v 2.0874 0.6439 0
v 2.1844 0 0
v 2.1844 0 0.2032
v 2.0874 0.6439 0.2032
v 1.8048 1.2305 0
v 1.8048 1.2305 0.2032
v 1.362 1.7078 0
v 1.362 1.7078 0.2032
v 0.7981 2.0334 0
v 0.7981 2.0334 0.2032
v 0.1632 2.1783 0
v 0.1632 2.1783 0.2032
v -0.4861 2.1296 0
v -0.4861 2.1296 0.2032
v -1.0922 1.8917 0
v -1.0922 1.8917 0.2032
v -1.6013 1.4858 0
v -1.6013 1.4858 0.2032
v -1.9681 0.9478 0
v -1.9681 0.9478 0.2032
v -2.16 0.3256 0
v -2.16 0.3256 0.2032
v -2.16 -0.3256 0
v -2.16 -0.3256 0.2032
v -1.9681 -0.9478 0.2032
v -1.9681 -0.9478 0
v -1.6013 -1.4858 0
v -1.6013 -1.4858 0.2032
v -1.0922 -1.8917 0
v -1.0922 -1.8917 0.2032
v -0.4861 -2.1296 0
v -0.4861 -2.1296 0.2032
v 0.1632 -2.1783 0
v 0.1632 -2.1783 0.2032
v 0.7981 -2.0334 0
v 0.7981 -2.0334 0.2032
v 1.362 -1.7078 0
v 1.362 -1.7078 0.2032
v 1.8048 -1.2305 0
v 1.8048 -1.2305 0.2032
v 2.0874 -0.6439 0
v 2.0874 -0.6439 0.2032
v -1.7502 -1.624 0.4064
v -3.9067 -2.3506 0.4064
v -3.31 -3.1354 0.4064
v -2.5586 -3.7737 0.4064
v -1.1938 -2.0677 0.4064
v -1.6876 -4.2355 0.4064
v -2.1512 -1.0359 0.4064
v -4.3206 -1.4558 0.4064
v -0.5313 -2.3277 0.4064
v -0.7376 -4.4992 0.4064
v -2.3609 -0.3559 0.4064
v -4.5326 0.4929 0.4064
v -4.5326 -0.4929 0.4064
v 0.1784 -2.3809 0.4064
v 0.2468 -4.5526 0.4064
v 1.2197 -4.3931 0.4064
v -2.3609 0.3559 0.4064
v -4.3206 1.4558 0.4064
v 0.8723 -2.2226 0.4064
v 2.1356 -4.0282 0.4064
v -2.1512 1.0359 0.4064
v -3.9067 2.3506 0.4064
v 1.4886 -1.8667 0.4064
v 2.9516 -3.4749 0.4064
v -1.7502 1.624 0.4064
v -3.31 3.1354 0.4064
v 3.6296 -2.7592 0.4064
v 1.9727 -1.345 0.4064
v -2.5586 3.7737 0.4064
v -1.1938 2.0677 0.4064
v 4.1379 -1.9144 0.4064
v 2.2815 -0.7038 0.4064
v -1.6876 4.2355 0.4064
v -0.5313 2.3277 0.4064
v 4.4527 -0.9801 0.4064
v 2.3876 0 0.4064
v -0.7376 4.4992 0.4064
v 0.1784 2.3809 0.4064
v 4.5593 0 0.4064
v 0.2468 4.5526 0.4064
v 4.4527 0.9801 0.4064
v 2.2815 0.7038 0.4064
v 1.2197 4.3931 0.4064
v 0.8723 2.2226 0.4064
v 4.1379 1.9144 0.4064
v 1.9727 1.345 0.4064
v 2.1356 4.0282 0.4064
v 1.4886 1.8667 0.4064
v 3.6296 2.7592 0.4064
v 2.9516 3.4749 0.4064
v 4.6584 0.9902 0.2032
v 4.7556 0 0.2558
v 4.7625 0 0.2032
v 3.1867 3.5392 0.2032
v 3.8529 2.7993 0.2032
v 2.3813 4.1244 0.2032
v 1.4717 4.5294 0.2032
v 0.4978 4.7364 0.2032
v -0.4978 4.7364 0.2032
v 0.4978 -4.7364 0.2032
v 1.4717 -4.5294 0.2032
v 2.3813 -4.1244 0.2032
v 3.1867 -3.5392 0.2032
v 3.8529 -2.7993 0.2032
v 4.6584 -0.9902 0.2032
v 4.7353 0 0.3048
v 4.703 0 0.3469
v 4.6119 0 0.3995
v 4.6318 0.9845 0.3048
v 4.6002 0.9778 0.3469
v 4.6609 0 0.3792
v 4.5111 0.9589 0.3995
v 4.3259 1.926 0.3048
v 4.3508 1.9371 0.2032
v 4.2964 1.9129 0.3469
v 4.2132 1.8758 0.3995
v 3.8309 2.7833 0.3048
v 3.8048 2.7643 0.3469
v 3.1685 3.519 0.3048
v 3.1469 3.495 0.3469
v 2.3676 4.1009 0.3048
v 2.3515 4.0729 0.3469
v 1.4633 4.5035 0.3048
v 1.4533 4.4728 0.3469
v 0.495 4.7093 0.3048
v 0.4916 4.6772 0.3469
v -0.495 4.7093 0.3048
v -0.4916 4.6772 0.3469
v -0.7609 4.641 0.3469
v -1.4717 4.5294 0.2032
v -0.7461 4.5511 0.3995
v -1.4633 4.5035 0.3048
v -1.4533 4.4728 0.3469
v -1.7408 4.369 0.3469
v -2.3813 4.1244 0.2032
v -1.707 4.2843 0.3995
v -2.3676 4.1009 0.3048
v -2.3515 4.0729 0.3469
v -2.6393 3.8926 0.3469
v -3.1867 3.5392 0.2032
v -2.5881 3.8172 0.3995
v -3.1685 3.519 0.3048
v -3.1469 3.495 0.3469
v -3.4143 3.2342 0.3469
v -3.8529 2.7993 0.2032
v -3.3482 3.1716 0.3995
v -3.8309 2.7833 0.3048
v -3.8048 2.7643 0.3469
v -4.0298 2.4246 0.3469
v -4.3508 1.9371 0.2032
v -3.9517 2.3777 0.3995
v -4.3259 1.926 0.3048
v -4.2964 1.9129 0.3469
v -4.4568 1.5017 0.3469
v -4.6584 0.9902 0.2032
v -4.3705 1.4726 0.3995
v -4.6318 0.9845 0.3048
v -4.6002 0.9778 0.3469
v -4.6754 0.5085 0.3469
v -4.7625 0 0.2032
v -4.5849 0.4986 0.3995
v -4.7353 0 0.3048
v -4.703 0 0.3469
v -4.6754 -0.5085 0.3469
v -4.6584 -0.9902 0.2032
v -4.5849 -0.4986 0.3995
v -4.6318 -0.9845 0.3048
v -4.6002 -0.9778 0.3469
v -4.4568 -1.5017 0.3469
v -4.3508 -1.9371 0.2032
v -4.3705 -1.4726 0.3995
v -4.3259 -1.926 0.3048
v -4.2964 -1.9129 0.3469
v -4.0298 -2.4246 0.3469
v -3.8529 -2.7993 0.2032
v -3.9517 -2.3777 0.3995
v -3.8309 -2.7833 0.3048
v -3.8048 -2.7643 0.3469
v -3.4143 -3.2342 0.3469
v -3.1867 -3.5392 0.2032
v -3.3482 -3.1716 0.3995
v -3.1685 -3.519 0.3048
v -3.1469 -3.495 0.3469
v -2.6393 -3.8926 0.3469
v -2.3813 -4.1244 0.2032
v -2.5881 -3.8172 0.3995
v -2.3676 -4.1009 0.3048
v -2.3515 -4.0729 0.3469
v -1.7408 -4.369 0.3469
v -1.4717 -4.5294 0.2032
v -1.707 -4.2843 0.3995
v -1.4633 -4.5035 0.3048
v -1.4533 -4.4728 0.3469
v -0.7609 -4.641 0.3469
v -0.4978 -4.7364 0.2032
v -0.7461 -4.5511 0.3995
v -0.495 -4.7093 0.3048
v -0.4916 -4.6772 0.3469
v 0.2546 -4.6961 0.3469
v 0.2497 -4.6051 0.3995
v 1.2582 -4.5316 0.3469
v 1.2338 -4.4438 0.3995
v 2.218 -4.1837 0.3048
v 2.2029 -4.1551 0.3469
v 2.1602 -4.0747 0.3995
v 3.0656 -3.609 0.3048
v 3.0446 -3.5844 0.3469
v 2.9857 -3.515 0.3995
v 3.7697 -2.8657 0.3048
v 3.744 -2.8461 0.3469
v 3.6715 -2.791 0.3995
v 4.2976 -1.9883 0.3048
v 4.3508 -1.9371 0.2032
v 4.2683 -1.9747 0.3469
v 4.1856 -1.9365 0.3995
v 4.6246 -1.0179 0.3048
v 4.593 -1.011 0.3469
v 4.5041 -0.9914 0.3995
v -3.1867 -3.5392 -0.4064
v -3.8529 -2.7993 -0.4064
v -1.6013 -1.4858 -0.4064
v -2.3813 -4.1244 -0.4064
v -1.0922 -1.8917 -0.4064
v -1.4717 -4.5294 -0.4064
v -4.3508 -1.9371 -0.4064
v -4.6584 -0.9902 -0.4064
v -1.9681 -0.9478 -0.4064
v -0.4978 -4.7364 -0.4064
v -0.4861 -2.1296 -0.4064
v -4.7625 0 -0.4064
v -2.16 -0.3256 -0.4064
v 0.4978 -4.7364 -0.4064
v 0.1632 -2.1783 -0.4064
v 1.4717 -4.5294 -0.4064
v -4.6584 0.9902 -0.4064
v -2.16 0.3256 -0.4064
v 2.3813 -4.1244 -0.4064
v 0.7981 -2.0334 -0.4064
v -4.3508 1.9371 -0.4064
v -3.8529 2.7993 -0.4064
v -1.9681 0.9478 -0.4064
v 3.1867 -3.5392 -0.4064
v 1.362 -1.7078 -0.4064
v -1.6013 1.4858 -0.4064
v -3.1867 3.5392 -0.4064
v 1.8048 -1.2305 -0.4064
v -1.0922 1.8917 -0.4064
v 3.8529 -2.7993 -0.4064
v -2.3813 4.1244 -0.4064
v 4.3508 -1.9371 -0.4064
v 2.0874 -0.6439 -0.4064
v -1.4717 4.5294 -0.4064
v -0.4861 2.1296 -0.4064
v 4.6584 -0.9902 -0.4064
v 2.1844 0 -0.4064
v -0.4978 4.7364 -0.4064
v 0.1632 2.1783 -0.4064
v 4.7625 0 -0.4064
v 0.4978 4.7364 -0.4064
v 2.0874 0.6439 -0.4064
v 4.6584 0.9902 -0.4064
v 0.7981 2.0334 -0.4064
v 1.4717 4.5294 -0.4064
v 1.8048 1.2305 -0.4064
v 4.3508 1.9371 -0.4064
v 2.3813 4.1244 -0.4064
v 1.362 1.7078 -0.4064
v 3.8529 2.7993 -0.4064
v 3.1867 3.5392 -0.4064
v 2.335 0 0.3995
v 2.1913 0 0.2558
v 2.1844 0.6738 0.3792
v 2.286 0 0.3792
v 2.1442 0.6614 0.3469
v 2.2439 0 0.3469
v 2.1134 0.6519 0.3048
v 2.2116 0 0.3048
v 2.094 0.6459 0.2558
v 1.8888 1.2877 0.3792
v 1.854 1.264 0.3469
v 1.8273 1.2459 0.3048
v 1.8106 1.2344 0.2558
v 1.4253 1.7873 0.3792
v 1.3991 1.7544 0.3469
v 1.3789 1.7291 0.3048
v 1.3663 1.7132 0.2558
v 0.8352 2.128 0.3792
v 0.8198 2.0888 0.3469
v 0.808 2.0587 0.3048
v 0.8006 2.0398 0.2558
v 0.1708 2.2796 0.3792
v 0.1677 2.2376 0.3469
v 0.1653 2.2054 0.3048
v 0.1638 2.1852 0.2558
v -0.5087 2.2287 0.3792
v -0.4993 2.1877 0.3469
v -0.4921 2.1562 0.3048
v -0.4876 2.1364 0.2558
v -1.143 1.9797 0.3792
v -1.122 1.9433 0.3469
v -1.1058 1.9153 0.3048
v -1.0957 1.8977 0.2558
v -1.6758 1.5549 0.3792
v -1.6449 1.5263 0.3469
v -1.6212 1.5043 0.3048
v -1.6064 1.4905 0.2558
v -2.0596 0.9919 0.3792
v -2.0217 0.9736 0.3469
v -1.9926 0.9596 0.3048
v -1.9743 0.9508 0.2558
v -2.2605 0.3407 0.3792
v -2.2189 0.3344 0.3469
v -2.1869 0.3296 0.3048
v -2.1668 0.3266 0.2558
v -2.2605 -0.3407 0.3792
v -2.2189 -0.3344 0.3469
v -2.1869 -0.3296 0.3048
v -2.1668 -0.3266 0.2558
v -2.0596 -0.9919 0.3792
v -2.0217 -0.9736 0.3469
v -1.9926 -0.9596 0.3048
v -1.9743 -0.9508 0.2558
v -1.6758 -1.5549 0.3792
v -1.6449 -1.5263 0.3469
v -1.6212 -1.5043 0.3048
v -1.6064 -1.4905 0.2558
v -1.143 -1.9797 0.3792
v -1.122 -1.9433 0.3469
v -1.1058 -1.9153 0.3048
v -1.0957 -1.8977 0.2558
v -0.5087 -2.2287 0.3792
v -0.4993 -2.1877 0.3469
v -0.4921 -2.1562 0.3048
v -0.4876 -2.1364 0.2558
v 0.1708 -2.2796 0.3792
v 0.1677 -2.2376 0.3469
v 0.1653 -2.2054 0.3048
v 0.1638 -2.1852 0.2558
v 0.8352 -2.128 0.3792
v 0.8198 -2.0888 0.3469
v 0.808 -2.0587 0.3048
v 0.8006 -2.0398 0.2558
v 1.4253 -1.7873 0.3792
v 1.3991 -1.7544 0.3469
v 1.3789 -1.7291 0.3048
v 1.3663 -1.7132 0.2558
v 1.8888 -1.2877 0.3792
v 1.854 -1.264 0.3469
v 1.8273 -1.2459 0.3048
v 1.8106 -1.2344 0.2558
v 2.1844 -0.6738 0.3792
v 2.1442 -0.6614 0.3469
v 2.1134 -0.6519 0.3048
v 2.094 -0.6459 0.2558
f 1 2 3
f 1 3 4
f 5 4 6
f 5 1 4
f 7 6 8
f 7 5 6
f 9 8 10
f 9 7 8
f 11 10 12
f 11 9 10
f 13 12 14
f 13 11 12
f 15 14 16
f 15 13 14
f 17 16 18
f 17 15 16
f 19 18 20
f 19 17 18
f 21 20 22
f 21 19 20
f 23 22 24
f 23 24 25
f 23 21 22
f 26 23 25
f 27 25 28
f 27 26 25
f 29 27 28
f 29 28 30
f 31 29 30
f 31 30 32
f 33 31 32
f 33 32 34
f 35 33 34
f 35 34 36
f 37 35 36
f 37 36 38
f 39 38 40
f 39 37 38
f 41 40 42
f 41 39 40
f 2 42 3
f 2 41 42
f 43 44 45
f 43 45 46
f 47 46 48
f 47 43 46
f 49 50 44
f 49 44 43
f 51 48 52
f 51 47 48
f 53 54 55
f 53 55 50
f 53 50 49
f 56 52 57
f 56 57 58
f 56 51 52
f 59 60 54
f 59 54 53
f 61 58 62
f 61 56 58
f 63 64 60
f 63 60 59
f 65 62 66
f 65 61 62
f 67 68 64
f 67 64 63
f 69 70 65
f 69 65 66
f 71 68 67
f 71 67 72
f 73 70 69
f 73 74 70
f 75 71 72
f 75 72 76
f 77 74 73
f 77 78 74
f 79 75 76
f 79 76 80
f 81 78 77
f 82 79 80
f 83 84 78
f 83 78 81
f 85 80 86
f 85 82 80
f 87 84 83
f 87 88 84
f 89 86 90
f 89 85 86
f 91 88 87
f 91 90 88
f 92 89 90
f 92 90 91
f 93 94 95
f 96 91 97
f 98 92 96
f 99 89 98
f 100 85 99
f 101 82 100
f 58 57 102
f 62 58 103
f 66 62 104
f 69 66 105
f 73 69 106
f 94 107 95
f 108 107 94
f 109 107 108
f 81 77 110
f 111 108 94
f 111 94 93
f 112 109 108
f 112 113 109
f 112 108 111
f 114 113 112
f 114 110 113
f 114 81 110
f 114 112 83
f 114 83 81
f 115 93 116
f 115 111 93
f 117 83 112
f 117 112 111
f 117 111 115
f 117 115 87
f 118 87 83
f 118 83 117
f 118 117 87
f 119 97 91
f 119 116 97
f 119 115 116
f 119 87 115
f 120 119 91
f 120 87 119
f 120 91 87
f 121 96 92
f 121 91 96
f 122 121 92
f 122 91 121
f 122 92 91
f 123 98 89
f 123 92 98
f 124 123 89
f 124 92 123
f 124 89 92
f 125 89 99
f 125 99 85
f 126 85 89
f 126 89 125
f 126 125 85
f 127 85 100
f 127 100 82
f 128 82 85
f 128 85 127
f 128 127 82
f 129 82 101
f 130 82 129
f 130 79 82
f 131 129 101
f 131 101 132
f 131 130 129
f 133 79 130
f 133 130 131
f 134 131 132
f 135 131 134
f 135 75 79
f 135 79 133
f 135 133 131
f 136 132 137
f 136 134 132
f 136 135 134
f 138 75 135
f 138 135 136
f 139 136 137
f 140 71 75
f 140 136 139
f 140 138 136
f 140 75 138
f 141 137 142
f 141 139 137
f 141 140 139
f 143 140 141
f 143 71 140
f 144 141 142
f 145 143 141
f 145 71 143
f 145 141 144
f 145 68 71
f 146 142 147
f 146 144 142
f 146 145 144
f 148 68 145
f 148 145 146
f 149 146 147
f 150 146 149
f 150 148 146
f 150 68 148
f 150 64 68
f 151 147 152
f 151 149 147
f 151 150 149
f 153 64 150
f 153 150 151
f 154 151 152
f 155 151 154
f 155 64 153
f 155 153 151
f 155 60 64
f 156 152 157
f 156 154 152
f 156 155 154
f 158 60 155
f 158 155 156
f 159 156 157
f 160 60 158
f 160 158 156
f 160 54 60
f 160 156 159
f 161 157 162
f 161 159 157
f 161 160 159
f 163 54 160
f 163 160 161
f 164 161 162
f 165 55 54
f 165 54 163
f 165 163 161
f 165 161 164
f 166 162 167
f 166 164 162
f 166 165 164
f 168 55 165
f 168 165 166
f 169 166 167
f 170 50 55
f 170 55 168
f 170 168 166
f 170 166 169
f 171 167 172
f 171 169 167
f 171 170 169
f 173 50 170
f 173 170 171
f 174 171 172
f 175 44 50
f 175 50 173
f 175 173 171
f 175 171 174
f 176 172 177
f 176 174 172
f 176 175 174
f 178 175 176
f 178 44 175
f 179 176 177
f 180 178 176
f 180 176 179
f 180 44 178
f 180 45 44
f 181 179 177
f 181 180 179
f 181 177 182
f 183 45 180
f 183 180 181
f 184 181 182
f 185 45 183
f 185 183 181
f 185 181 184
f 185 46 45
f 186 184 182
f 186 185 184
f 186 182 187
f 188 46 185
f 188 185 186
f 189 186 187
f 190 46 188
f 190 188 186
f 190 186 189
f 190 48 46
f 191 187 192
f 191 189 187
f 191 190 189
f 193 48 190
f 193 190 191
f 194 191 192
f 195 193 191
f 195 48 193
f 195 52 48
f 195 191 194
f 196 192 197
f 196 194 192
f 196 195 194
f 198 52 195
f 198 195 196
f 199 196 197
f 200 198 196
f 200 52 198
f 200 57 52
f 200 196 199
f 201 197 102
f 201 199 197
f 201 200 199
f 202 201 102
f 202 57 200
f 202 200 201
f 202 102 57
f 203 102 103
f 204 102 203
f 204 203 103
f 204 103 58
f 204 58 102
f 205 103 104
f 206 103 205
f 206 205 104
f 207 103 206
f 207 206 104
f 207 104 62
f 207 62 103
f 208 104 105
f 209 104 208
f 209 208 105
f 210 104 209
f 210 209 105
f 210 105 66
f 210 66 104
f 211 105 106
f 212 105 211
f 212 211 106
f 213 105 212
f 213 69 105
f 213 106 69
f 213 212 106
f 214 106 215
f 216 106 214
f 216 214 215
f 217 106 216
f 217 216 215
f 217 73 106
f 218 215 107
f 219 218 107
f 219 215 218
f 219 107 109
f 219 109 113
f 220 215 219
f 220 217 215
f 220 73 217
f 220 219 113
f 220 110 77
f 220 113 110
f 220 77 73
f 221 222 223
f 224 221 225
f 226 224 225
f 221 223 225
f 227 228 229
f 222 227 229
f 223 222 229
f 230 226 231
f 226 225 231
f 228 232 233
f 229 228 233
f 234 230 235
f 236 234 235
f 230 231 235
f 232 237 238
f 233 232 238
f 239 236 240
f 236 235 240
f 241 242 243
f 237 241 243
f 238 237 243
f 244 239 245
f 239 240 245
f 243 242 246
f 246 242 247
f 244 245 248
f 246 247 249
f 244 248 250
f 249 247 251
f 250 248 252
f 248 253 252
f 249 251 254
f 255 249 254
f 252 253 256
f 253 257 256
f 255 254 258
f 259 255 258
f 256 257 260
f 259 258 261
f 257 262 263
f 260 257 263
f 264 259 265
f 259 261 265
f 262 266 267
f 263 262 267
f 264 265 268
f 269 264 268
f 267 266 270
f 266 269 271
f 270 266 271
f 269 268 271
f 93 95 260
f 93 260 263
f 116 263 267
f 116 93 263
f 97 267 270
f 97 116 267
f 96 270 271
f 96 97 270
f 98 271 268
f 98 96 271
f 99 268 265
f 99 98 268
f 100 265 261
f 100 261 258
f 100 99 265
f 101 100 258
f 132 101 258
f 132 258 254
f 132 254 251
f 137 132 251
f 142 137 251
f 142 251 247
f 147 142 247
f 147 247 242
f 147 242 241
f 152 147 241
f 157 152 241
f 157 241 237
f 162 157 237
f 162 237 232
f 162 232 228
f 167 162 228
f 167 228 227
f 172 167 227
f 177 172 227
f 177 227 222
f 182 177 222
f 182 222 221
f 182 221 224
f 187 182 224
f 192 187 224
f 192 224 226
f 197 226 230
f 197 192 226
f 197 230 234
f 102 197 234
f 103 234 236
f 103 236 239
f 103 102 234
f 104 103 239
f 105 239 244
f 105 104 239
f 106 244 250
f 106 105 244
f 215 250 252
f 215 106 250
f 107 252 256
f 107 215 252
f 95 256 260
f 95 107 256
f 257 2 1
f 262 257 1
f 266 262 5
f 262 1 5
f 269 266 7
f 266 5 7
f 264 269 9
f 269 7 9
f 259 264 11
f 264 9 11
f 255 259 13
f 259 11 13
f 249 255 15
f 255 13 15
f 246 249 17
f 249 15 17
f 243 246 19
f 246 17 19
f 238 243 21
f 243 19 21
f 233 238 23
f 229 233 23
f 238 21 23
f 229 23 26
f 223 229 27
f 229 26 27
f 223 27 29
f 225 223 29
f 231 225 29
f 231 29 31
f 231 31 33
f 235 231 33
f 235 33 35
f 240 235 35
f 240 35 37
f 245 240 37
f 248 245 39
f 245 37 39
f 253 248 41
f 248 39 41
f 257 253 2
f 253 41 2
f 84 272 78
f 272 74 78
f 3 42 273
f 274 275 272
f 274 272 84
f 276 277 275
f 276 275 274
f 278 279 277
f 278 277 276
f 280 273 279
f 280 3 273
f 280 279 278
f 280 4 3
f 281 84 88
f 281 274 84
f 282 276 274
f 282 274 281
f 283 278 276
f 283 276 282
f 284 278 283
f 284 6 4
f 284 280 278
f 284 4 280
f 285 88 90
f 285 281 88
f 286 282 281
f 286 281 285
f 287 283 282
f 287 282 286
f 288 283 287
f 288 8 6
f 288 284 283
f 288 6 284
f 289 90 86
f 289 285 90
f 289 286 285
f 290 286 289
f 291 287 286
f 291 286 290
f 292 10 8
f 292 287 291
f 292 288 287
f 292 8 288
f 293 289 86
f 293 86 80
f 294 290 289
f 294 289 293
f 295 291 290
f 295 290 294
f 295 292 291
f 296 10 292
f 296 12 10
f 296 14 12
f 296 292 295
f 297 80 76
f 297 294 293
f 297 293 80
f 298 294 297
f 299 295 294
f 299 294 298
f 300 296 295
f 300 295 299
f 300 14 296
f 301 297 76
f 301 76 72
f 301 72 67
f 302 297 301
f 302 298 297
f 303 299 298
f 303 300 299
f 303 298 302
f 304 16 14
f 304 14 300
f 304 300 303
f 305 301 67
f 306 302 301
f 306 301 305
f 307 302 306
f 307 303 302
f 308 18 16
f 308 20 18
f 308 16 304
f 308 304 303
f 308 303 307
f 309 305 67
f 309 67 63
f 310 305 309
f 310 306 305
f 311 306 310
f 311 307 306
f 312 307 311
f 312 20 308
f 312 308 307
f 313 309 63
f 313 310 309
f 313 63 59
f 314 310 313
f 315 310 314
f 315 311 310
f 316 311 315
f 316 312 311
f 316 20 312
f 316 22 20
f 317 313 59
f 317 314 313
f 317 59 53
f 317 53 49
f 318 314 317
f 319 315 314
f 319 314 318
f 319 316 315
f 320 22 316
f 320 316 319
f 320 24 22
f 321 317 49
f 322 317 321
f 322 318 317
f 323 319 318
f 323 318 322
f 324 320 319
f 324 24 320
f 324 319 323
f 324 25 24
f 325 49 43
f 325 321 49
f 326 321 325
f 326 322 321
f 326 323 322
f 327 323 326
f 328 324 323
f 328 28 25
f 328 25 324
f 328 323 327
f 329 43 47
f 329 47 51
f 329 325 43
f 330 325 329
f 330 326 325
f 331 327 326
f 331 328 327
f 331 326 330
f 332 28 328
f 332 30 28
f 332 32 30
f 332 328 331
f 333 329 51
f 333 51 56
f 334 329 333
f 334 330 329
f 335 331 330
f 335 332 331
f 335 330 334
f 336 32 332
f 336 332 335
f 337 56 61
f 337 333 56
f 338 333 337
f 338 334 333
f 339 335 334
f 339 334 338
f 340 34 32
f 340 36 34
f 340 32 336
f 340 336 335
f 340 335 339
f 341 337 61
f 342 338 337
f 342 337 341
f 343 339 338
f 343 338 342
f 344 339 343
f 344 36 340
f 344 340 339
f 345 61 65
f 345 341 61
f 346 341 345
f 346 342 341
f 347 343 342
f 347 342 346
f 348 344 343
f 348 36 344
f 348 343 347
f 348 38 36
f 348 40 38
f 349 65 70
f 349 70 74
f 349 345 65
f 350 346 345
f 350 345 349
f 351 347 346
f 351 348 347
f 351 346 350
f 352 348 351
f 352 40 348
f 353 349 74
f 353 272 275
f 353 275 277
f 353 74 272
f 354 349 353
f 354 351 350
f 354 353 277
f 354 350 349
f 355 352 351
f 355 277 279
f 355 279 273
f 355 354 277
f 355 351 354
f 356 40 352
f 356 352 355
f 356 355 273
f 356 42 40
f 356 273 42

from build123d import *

# Parameters (mm, degrees)
SKETCH3_R                = 4.7625
SKETCH3_R_2              = 2.1844
BOSS_EXTRUDE1_DEPTH      = 0.4064
BOSS_EXTRUDE1_DEPTH_BACK = 0.4064
FILLET1_R                = 0.2032


with BuildPart() as part:
    # Sketch3 → Boss-Extrude1 (new body, two sides)
    with BuildSketch(Plane.XY) as boss_extrude1_sk:
        Circle(SKETCH3_R)
        Circle(SKETCH3_R_2, mode=Mode.SUBTRACT)
    extrude(amount=BOSS_EXTRUDE1_DEPTH)
    extrude(boss_extrude1_sk.sketch, amount=-BOSS_EXTRUDE1_DEPTH_BACK)

    # Fillet1
    fillet1_edges = [part.edges().sort_by_distance(p)[0] for p in [
        (-4.7625, 0, 0.4064),
        (-2.1844, 0, 0.4064),
    ]]
    fillet(fillet1_edges, radius=FILLET1_R)


solid = part.part
